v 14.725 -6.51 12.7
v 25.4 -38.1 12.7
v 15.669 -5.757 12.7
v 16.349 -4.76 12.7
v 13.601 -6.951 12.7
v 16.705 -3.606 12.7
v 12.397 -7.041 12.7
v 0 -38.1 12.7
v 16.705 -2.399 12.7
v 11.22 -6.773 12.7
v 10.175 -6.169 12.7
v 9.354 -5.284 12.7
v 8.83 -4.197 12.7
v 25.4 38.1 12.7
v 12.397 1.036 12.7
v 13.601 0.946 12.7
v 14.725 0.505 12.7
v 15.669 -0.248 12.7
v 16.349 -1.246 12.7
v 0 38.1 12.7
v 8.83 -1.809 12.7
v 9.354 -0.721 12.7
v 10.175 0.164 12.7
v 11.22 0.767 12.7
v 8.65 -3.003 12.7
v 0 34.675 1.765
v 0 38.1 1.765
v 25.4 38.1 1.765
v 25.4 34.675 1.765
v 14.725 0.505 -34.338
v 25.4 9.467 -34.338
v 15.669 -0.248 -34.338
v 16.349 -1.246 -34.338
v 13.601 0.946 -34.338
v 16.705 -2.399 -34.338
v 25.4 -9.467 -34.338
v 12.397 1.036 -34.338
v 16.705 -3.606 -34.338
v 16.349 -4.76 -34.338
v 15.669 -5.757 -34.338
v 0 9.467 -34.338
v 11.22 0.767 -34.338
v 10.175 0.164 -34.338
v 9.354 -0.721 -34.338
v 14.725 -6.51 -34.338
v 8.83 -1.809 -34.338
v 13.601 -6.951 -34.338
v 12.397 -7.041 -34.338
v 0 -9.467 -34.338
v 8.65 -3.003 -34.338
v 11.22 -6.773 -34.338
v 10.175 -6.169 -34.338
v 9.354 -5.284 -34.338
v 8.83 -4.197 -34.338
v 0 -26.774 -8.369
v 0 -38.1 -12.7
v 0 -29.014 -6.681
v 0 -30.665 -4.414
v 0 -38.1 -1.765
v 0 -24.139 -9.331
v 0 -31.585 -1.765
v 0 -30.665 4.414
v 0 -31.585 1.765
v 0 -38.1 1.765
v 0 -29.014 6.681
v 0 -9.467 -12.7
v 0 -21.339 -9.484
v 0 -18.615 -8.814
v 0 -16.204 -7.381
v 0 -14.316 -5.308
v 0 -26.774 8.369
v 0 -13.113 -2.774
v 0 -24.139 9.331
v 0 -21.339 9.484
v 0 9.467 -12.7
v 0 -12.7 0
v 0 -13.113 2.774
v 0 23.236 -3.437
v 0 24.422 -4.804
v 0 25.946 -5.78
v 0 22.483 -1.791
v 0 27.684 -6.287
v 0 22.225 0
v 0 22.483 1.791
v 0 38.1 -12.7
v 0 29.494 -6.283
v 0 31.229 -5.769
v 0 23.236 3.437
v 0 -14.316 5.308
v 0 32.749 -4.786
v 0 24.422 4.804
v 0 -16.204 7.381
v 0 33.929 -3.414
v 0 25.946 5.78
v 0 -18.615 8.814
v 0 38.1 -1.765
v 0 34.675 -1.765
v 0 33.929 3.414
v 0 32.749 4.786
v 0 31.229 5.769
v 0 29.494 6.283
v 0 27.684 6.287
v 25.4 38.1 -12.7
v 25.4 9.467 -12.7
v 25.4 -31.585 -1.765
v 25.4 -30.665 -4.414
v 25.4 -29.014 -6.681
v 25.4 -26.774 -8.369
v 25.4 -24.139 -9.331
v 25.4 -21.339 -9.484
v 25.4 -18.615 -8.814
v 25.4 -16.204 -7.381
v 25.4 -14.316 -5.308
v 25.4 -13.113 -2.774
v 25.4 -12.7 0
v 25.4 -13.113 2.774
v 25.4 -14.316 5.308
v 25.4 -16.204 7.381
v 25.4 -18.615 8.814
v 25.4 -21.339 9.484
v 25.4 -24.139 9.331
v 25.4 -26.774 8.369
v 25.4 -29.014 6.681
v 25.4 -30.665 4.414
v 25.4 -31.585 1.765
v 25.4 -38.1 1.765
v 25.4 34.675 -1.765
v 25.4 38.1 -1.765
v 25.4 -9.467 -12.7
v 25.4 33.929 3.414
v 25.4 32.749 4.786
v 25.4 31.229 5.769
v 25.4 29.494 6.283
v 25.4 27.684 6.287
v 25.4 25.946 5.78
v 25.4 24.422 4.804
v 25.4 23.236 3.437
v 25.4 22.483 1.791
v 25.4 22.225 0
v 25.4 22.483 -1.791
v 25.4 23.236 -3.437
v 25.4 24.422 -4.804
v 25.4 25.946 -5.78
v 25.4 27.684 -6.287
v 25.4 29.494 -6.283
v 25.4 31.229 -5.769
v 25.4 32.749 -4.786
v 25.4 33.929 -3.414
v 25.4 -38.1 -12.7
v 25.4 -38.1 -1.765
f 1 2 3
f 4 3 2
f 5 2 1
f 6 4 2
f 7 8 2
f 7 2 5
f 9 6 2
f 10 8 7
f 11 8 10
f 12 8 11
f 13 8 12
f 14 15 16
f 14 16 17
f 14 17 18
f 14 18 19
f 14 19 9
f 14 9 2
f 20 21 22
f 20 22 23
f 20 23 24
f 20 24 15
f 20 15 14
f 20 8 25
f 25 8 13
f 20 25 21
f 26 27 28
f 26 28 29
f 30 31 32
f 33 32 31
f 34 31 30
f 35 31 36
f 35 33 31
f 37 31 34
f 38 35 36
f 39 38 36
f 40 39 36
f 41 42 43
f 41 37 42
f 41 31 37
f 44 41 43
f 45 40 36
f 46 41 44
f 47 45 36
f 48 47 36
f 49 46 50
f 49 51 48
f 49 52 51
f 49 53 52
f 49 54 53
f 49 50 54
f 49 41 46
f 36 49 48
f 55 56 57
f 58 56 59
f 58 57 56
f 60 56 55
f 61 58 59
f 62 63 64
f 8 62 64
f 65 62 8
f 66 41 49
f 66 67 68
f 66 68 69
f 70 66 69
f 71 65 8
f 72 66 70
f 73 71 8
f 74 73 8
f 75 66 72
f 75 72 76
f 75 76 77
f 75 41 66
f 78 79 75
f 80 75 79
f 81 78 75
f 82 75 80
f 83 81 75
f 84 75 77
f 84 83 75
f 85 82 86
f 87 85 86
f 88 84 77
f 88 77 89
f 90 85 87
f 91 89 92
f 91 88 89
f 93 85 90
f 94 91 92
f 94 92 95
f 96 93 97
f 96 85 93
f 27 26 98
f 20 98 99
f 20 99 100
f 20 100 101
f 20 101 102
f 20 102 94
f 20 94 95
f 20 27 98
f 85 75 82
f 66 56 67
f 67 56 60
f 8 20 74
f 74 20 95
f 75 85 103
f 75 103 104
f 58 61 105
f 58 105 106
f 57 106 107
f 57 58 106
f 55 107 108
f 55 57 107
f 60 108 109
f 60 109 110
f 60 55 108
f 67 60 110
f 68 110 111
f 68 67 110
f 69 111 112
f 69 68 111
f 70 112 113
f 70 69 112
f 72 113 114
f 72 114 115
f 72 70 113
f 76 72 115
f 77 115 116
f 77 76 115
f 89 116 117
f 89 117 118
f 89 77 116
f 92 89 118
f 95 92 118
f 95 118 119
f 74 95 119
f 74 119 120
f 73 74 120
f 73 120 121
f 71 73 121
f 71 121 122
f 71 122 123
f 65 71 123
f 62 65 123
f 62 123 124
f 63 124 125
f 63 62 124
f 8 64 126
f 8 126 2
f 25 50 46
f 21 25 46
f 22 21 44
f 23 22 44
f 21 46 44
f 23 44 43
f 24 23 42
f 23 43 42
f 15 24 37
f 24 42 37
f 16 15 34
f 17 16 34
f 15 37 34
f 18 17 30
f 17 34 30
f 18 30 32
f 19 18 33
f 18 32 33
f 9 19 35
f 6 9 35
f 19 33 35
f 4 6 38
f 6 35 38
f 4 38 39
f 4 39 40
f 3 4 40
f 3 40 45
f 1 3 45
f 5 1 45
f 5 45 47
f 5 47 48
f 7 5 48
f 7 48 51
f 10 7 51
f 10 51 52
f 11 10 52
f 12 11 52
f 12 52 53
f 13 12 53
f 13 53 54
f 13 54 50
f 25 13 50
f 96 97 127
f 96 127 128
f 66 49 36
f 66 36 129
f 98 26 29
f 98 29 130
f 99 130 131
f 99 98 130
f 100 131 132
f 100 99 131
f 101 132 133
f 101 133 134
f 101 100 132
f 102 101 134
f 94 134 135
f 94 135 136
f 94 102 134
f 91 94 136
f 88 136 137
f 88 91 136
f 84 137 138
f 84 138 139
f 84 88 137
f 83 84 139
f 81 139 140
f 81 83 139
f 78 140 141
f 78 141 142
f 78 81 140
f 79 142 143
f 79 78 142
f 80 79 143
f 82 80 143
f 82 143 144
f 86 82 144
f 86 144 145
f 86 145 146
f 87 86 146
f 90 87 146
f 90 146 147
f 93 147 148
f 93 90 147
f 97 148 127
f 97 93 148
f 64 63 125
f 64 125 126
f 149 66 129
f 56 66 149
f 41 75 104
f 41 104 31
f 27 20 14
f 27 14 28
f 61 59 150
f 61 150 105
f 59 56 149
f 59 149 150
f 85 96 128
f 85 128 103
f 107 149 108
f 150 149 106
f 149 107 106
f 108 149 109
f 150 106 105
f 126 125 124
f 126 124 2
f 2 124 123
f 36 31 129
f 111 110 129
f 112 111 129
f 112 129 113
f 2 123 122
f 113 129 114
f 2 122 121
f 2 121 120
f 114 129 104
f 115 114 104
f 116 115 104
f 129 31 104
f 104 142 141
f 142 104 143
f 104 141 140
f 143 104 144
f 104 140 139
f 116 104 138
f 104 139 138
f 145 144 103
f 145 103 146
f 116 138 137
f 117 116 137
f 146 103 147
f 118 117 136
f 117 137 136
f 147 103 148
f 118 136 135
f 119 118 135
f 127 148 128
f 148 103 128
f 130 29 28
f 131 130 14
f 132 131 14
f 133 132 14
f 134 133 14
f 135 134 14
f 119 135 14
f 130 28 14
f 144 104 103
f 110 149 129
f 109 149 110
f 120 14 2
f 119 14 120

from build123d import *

# Parameters (mm, degrees)
BOSS_EXTRUDE1_DEPTH = 25.4
SKETCH3_R           = 4.05
CUT_EXTRUDE1_DEPTH  = 48.0377


with BuildPart() as part:
    # Sketch1 → Boss-Extrude1 (new body)
    with BuildSketch(Plane(origin=(0, 0, 0), x_dir=(0, 0, -1), z_dir=(1, 0, 0))):
        with BuildLine():
            Line((-1.764817843, 38.1), (-1.764817843, 34.67482934))
            ThreePointArc((-1.764817843, 34.67482934), (0, 22.225), (1.764817843, 34.67482934))
            Line((1.764817843, 34.67482934), (1.764817843, 38.1))
            Line((1.764817843, 38.1), (12.7, 38.1))
            Line((12.7, 38.1), (12.7, 9.46650416))
            Line((12.7, 9.46650416), (34.3377, 9.46650416))
            Line((34.3377, 9.46650416), (34.3377, -9.46650416))
            Line((34.3377, -9.46650416), (12.7, -9.46650416))
            Line((12.7, -9.46650416), (12.7, -38.1))
            Line((12.7, -38.1), (1.764817843, -38.1))
            Line((1.764817843, -38.1), (1.764817843, -31.585077082))
            ThreePointArc((1.764817843, -31.585077082), (0, -12.7), (-1.764817843, -31.585077082))
            Line((-1.764817843, -31.585077082), (-1.764817843, -38.1))
            Line((-1.764817843, -38.1), (-12.7, -38.1))
            Line((-12.7, -38.1), (-12.7, 38.1))
            Line((-12.7, 38.1), (-1.764817843, 38.1))
        make_face()
    extrude(amount=BOSS_EXTRUDE1_DEPTH)

    # Sketch3 → Cut-Extrude1 (cut, through all)
    with BuildSketch(Plane(origin=(0, 0, -34.3377), x_dir=(-1, 0, 0), z_dir=(0, 0, -1))):
        with Locations((-12.7, -3.002772529)):
            Circle(SKETCH3_R)
    extrude(amount=-CUT_EXTRUDE1_DEPTH, mode=Mode.SUBTRACT)


solid = part.part
